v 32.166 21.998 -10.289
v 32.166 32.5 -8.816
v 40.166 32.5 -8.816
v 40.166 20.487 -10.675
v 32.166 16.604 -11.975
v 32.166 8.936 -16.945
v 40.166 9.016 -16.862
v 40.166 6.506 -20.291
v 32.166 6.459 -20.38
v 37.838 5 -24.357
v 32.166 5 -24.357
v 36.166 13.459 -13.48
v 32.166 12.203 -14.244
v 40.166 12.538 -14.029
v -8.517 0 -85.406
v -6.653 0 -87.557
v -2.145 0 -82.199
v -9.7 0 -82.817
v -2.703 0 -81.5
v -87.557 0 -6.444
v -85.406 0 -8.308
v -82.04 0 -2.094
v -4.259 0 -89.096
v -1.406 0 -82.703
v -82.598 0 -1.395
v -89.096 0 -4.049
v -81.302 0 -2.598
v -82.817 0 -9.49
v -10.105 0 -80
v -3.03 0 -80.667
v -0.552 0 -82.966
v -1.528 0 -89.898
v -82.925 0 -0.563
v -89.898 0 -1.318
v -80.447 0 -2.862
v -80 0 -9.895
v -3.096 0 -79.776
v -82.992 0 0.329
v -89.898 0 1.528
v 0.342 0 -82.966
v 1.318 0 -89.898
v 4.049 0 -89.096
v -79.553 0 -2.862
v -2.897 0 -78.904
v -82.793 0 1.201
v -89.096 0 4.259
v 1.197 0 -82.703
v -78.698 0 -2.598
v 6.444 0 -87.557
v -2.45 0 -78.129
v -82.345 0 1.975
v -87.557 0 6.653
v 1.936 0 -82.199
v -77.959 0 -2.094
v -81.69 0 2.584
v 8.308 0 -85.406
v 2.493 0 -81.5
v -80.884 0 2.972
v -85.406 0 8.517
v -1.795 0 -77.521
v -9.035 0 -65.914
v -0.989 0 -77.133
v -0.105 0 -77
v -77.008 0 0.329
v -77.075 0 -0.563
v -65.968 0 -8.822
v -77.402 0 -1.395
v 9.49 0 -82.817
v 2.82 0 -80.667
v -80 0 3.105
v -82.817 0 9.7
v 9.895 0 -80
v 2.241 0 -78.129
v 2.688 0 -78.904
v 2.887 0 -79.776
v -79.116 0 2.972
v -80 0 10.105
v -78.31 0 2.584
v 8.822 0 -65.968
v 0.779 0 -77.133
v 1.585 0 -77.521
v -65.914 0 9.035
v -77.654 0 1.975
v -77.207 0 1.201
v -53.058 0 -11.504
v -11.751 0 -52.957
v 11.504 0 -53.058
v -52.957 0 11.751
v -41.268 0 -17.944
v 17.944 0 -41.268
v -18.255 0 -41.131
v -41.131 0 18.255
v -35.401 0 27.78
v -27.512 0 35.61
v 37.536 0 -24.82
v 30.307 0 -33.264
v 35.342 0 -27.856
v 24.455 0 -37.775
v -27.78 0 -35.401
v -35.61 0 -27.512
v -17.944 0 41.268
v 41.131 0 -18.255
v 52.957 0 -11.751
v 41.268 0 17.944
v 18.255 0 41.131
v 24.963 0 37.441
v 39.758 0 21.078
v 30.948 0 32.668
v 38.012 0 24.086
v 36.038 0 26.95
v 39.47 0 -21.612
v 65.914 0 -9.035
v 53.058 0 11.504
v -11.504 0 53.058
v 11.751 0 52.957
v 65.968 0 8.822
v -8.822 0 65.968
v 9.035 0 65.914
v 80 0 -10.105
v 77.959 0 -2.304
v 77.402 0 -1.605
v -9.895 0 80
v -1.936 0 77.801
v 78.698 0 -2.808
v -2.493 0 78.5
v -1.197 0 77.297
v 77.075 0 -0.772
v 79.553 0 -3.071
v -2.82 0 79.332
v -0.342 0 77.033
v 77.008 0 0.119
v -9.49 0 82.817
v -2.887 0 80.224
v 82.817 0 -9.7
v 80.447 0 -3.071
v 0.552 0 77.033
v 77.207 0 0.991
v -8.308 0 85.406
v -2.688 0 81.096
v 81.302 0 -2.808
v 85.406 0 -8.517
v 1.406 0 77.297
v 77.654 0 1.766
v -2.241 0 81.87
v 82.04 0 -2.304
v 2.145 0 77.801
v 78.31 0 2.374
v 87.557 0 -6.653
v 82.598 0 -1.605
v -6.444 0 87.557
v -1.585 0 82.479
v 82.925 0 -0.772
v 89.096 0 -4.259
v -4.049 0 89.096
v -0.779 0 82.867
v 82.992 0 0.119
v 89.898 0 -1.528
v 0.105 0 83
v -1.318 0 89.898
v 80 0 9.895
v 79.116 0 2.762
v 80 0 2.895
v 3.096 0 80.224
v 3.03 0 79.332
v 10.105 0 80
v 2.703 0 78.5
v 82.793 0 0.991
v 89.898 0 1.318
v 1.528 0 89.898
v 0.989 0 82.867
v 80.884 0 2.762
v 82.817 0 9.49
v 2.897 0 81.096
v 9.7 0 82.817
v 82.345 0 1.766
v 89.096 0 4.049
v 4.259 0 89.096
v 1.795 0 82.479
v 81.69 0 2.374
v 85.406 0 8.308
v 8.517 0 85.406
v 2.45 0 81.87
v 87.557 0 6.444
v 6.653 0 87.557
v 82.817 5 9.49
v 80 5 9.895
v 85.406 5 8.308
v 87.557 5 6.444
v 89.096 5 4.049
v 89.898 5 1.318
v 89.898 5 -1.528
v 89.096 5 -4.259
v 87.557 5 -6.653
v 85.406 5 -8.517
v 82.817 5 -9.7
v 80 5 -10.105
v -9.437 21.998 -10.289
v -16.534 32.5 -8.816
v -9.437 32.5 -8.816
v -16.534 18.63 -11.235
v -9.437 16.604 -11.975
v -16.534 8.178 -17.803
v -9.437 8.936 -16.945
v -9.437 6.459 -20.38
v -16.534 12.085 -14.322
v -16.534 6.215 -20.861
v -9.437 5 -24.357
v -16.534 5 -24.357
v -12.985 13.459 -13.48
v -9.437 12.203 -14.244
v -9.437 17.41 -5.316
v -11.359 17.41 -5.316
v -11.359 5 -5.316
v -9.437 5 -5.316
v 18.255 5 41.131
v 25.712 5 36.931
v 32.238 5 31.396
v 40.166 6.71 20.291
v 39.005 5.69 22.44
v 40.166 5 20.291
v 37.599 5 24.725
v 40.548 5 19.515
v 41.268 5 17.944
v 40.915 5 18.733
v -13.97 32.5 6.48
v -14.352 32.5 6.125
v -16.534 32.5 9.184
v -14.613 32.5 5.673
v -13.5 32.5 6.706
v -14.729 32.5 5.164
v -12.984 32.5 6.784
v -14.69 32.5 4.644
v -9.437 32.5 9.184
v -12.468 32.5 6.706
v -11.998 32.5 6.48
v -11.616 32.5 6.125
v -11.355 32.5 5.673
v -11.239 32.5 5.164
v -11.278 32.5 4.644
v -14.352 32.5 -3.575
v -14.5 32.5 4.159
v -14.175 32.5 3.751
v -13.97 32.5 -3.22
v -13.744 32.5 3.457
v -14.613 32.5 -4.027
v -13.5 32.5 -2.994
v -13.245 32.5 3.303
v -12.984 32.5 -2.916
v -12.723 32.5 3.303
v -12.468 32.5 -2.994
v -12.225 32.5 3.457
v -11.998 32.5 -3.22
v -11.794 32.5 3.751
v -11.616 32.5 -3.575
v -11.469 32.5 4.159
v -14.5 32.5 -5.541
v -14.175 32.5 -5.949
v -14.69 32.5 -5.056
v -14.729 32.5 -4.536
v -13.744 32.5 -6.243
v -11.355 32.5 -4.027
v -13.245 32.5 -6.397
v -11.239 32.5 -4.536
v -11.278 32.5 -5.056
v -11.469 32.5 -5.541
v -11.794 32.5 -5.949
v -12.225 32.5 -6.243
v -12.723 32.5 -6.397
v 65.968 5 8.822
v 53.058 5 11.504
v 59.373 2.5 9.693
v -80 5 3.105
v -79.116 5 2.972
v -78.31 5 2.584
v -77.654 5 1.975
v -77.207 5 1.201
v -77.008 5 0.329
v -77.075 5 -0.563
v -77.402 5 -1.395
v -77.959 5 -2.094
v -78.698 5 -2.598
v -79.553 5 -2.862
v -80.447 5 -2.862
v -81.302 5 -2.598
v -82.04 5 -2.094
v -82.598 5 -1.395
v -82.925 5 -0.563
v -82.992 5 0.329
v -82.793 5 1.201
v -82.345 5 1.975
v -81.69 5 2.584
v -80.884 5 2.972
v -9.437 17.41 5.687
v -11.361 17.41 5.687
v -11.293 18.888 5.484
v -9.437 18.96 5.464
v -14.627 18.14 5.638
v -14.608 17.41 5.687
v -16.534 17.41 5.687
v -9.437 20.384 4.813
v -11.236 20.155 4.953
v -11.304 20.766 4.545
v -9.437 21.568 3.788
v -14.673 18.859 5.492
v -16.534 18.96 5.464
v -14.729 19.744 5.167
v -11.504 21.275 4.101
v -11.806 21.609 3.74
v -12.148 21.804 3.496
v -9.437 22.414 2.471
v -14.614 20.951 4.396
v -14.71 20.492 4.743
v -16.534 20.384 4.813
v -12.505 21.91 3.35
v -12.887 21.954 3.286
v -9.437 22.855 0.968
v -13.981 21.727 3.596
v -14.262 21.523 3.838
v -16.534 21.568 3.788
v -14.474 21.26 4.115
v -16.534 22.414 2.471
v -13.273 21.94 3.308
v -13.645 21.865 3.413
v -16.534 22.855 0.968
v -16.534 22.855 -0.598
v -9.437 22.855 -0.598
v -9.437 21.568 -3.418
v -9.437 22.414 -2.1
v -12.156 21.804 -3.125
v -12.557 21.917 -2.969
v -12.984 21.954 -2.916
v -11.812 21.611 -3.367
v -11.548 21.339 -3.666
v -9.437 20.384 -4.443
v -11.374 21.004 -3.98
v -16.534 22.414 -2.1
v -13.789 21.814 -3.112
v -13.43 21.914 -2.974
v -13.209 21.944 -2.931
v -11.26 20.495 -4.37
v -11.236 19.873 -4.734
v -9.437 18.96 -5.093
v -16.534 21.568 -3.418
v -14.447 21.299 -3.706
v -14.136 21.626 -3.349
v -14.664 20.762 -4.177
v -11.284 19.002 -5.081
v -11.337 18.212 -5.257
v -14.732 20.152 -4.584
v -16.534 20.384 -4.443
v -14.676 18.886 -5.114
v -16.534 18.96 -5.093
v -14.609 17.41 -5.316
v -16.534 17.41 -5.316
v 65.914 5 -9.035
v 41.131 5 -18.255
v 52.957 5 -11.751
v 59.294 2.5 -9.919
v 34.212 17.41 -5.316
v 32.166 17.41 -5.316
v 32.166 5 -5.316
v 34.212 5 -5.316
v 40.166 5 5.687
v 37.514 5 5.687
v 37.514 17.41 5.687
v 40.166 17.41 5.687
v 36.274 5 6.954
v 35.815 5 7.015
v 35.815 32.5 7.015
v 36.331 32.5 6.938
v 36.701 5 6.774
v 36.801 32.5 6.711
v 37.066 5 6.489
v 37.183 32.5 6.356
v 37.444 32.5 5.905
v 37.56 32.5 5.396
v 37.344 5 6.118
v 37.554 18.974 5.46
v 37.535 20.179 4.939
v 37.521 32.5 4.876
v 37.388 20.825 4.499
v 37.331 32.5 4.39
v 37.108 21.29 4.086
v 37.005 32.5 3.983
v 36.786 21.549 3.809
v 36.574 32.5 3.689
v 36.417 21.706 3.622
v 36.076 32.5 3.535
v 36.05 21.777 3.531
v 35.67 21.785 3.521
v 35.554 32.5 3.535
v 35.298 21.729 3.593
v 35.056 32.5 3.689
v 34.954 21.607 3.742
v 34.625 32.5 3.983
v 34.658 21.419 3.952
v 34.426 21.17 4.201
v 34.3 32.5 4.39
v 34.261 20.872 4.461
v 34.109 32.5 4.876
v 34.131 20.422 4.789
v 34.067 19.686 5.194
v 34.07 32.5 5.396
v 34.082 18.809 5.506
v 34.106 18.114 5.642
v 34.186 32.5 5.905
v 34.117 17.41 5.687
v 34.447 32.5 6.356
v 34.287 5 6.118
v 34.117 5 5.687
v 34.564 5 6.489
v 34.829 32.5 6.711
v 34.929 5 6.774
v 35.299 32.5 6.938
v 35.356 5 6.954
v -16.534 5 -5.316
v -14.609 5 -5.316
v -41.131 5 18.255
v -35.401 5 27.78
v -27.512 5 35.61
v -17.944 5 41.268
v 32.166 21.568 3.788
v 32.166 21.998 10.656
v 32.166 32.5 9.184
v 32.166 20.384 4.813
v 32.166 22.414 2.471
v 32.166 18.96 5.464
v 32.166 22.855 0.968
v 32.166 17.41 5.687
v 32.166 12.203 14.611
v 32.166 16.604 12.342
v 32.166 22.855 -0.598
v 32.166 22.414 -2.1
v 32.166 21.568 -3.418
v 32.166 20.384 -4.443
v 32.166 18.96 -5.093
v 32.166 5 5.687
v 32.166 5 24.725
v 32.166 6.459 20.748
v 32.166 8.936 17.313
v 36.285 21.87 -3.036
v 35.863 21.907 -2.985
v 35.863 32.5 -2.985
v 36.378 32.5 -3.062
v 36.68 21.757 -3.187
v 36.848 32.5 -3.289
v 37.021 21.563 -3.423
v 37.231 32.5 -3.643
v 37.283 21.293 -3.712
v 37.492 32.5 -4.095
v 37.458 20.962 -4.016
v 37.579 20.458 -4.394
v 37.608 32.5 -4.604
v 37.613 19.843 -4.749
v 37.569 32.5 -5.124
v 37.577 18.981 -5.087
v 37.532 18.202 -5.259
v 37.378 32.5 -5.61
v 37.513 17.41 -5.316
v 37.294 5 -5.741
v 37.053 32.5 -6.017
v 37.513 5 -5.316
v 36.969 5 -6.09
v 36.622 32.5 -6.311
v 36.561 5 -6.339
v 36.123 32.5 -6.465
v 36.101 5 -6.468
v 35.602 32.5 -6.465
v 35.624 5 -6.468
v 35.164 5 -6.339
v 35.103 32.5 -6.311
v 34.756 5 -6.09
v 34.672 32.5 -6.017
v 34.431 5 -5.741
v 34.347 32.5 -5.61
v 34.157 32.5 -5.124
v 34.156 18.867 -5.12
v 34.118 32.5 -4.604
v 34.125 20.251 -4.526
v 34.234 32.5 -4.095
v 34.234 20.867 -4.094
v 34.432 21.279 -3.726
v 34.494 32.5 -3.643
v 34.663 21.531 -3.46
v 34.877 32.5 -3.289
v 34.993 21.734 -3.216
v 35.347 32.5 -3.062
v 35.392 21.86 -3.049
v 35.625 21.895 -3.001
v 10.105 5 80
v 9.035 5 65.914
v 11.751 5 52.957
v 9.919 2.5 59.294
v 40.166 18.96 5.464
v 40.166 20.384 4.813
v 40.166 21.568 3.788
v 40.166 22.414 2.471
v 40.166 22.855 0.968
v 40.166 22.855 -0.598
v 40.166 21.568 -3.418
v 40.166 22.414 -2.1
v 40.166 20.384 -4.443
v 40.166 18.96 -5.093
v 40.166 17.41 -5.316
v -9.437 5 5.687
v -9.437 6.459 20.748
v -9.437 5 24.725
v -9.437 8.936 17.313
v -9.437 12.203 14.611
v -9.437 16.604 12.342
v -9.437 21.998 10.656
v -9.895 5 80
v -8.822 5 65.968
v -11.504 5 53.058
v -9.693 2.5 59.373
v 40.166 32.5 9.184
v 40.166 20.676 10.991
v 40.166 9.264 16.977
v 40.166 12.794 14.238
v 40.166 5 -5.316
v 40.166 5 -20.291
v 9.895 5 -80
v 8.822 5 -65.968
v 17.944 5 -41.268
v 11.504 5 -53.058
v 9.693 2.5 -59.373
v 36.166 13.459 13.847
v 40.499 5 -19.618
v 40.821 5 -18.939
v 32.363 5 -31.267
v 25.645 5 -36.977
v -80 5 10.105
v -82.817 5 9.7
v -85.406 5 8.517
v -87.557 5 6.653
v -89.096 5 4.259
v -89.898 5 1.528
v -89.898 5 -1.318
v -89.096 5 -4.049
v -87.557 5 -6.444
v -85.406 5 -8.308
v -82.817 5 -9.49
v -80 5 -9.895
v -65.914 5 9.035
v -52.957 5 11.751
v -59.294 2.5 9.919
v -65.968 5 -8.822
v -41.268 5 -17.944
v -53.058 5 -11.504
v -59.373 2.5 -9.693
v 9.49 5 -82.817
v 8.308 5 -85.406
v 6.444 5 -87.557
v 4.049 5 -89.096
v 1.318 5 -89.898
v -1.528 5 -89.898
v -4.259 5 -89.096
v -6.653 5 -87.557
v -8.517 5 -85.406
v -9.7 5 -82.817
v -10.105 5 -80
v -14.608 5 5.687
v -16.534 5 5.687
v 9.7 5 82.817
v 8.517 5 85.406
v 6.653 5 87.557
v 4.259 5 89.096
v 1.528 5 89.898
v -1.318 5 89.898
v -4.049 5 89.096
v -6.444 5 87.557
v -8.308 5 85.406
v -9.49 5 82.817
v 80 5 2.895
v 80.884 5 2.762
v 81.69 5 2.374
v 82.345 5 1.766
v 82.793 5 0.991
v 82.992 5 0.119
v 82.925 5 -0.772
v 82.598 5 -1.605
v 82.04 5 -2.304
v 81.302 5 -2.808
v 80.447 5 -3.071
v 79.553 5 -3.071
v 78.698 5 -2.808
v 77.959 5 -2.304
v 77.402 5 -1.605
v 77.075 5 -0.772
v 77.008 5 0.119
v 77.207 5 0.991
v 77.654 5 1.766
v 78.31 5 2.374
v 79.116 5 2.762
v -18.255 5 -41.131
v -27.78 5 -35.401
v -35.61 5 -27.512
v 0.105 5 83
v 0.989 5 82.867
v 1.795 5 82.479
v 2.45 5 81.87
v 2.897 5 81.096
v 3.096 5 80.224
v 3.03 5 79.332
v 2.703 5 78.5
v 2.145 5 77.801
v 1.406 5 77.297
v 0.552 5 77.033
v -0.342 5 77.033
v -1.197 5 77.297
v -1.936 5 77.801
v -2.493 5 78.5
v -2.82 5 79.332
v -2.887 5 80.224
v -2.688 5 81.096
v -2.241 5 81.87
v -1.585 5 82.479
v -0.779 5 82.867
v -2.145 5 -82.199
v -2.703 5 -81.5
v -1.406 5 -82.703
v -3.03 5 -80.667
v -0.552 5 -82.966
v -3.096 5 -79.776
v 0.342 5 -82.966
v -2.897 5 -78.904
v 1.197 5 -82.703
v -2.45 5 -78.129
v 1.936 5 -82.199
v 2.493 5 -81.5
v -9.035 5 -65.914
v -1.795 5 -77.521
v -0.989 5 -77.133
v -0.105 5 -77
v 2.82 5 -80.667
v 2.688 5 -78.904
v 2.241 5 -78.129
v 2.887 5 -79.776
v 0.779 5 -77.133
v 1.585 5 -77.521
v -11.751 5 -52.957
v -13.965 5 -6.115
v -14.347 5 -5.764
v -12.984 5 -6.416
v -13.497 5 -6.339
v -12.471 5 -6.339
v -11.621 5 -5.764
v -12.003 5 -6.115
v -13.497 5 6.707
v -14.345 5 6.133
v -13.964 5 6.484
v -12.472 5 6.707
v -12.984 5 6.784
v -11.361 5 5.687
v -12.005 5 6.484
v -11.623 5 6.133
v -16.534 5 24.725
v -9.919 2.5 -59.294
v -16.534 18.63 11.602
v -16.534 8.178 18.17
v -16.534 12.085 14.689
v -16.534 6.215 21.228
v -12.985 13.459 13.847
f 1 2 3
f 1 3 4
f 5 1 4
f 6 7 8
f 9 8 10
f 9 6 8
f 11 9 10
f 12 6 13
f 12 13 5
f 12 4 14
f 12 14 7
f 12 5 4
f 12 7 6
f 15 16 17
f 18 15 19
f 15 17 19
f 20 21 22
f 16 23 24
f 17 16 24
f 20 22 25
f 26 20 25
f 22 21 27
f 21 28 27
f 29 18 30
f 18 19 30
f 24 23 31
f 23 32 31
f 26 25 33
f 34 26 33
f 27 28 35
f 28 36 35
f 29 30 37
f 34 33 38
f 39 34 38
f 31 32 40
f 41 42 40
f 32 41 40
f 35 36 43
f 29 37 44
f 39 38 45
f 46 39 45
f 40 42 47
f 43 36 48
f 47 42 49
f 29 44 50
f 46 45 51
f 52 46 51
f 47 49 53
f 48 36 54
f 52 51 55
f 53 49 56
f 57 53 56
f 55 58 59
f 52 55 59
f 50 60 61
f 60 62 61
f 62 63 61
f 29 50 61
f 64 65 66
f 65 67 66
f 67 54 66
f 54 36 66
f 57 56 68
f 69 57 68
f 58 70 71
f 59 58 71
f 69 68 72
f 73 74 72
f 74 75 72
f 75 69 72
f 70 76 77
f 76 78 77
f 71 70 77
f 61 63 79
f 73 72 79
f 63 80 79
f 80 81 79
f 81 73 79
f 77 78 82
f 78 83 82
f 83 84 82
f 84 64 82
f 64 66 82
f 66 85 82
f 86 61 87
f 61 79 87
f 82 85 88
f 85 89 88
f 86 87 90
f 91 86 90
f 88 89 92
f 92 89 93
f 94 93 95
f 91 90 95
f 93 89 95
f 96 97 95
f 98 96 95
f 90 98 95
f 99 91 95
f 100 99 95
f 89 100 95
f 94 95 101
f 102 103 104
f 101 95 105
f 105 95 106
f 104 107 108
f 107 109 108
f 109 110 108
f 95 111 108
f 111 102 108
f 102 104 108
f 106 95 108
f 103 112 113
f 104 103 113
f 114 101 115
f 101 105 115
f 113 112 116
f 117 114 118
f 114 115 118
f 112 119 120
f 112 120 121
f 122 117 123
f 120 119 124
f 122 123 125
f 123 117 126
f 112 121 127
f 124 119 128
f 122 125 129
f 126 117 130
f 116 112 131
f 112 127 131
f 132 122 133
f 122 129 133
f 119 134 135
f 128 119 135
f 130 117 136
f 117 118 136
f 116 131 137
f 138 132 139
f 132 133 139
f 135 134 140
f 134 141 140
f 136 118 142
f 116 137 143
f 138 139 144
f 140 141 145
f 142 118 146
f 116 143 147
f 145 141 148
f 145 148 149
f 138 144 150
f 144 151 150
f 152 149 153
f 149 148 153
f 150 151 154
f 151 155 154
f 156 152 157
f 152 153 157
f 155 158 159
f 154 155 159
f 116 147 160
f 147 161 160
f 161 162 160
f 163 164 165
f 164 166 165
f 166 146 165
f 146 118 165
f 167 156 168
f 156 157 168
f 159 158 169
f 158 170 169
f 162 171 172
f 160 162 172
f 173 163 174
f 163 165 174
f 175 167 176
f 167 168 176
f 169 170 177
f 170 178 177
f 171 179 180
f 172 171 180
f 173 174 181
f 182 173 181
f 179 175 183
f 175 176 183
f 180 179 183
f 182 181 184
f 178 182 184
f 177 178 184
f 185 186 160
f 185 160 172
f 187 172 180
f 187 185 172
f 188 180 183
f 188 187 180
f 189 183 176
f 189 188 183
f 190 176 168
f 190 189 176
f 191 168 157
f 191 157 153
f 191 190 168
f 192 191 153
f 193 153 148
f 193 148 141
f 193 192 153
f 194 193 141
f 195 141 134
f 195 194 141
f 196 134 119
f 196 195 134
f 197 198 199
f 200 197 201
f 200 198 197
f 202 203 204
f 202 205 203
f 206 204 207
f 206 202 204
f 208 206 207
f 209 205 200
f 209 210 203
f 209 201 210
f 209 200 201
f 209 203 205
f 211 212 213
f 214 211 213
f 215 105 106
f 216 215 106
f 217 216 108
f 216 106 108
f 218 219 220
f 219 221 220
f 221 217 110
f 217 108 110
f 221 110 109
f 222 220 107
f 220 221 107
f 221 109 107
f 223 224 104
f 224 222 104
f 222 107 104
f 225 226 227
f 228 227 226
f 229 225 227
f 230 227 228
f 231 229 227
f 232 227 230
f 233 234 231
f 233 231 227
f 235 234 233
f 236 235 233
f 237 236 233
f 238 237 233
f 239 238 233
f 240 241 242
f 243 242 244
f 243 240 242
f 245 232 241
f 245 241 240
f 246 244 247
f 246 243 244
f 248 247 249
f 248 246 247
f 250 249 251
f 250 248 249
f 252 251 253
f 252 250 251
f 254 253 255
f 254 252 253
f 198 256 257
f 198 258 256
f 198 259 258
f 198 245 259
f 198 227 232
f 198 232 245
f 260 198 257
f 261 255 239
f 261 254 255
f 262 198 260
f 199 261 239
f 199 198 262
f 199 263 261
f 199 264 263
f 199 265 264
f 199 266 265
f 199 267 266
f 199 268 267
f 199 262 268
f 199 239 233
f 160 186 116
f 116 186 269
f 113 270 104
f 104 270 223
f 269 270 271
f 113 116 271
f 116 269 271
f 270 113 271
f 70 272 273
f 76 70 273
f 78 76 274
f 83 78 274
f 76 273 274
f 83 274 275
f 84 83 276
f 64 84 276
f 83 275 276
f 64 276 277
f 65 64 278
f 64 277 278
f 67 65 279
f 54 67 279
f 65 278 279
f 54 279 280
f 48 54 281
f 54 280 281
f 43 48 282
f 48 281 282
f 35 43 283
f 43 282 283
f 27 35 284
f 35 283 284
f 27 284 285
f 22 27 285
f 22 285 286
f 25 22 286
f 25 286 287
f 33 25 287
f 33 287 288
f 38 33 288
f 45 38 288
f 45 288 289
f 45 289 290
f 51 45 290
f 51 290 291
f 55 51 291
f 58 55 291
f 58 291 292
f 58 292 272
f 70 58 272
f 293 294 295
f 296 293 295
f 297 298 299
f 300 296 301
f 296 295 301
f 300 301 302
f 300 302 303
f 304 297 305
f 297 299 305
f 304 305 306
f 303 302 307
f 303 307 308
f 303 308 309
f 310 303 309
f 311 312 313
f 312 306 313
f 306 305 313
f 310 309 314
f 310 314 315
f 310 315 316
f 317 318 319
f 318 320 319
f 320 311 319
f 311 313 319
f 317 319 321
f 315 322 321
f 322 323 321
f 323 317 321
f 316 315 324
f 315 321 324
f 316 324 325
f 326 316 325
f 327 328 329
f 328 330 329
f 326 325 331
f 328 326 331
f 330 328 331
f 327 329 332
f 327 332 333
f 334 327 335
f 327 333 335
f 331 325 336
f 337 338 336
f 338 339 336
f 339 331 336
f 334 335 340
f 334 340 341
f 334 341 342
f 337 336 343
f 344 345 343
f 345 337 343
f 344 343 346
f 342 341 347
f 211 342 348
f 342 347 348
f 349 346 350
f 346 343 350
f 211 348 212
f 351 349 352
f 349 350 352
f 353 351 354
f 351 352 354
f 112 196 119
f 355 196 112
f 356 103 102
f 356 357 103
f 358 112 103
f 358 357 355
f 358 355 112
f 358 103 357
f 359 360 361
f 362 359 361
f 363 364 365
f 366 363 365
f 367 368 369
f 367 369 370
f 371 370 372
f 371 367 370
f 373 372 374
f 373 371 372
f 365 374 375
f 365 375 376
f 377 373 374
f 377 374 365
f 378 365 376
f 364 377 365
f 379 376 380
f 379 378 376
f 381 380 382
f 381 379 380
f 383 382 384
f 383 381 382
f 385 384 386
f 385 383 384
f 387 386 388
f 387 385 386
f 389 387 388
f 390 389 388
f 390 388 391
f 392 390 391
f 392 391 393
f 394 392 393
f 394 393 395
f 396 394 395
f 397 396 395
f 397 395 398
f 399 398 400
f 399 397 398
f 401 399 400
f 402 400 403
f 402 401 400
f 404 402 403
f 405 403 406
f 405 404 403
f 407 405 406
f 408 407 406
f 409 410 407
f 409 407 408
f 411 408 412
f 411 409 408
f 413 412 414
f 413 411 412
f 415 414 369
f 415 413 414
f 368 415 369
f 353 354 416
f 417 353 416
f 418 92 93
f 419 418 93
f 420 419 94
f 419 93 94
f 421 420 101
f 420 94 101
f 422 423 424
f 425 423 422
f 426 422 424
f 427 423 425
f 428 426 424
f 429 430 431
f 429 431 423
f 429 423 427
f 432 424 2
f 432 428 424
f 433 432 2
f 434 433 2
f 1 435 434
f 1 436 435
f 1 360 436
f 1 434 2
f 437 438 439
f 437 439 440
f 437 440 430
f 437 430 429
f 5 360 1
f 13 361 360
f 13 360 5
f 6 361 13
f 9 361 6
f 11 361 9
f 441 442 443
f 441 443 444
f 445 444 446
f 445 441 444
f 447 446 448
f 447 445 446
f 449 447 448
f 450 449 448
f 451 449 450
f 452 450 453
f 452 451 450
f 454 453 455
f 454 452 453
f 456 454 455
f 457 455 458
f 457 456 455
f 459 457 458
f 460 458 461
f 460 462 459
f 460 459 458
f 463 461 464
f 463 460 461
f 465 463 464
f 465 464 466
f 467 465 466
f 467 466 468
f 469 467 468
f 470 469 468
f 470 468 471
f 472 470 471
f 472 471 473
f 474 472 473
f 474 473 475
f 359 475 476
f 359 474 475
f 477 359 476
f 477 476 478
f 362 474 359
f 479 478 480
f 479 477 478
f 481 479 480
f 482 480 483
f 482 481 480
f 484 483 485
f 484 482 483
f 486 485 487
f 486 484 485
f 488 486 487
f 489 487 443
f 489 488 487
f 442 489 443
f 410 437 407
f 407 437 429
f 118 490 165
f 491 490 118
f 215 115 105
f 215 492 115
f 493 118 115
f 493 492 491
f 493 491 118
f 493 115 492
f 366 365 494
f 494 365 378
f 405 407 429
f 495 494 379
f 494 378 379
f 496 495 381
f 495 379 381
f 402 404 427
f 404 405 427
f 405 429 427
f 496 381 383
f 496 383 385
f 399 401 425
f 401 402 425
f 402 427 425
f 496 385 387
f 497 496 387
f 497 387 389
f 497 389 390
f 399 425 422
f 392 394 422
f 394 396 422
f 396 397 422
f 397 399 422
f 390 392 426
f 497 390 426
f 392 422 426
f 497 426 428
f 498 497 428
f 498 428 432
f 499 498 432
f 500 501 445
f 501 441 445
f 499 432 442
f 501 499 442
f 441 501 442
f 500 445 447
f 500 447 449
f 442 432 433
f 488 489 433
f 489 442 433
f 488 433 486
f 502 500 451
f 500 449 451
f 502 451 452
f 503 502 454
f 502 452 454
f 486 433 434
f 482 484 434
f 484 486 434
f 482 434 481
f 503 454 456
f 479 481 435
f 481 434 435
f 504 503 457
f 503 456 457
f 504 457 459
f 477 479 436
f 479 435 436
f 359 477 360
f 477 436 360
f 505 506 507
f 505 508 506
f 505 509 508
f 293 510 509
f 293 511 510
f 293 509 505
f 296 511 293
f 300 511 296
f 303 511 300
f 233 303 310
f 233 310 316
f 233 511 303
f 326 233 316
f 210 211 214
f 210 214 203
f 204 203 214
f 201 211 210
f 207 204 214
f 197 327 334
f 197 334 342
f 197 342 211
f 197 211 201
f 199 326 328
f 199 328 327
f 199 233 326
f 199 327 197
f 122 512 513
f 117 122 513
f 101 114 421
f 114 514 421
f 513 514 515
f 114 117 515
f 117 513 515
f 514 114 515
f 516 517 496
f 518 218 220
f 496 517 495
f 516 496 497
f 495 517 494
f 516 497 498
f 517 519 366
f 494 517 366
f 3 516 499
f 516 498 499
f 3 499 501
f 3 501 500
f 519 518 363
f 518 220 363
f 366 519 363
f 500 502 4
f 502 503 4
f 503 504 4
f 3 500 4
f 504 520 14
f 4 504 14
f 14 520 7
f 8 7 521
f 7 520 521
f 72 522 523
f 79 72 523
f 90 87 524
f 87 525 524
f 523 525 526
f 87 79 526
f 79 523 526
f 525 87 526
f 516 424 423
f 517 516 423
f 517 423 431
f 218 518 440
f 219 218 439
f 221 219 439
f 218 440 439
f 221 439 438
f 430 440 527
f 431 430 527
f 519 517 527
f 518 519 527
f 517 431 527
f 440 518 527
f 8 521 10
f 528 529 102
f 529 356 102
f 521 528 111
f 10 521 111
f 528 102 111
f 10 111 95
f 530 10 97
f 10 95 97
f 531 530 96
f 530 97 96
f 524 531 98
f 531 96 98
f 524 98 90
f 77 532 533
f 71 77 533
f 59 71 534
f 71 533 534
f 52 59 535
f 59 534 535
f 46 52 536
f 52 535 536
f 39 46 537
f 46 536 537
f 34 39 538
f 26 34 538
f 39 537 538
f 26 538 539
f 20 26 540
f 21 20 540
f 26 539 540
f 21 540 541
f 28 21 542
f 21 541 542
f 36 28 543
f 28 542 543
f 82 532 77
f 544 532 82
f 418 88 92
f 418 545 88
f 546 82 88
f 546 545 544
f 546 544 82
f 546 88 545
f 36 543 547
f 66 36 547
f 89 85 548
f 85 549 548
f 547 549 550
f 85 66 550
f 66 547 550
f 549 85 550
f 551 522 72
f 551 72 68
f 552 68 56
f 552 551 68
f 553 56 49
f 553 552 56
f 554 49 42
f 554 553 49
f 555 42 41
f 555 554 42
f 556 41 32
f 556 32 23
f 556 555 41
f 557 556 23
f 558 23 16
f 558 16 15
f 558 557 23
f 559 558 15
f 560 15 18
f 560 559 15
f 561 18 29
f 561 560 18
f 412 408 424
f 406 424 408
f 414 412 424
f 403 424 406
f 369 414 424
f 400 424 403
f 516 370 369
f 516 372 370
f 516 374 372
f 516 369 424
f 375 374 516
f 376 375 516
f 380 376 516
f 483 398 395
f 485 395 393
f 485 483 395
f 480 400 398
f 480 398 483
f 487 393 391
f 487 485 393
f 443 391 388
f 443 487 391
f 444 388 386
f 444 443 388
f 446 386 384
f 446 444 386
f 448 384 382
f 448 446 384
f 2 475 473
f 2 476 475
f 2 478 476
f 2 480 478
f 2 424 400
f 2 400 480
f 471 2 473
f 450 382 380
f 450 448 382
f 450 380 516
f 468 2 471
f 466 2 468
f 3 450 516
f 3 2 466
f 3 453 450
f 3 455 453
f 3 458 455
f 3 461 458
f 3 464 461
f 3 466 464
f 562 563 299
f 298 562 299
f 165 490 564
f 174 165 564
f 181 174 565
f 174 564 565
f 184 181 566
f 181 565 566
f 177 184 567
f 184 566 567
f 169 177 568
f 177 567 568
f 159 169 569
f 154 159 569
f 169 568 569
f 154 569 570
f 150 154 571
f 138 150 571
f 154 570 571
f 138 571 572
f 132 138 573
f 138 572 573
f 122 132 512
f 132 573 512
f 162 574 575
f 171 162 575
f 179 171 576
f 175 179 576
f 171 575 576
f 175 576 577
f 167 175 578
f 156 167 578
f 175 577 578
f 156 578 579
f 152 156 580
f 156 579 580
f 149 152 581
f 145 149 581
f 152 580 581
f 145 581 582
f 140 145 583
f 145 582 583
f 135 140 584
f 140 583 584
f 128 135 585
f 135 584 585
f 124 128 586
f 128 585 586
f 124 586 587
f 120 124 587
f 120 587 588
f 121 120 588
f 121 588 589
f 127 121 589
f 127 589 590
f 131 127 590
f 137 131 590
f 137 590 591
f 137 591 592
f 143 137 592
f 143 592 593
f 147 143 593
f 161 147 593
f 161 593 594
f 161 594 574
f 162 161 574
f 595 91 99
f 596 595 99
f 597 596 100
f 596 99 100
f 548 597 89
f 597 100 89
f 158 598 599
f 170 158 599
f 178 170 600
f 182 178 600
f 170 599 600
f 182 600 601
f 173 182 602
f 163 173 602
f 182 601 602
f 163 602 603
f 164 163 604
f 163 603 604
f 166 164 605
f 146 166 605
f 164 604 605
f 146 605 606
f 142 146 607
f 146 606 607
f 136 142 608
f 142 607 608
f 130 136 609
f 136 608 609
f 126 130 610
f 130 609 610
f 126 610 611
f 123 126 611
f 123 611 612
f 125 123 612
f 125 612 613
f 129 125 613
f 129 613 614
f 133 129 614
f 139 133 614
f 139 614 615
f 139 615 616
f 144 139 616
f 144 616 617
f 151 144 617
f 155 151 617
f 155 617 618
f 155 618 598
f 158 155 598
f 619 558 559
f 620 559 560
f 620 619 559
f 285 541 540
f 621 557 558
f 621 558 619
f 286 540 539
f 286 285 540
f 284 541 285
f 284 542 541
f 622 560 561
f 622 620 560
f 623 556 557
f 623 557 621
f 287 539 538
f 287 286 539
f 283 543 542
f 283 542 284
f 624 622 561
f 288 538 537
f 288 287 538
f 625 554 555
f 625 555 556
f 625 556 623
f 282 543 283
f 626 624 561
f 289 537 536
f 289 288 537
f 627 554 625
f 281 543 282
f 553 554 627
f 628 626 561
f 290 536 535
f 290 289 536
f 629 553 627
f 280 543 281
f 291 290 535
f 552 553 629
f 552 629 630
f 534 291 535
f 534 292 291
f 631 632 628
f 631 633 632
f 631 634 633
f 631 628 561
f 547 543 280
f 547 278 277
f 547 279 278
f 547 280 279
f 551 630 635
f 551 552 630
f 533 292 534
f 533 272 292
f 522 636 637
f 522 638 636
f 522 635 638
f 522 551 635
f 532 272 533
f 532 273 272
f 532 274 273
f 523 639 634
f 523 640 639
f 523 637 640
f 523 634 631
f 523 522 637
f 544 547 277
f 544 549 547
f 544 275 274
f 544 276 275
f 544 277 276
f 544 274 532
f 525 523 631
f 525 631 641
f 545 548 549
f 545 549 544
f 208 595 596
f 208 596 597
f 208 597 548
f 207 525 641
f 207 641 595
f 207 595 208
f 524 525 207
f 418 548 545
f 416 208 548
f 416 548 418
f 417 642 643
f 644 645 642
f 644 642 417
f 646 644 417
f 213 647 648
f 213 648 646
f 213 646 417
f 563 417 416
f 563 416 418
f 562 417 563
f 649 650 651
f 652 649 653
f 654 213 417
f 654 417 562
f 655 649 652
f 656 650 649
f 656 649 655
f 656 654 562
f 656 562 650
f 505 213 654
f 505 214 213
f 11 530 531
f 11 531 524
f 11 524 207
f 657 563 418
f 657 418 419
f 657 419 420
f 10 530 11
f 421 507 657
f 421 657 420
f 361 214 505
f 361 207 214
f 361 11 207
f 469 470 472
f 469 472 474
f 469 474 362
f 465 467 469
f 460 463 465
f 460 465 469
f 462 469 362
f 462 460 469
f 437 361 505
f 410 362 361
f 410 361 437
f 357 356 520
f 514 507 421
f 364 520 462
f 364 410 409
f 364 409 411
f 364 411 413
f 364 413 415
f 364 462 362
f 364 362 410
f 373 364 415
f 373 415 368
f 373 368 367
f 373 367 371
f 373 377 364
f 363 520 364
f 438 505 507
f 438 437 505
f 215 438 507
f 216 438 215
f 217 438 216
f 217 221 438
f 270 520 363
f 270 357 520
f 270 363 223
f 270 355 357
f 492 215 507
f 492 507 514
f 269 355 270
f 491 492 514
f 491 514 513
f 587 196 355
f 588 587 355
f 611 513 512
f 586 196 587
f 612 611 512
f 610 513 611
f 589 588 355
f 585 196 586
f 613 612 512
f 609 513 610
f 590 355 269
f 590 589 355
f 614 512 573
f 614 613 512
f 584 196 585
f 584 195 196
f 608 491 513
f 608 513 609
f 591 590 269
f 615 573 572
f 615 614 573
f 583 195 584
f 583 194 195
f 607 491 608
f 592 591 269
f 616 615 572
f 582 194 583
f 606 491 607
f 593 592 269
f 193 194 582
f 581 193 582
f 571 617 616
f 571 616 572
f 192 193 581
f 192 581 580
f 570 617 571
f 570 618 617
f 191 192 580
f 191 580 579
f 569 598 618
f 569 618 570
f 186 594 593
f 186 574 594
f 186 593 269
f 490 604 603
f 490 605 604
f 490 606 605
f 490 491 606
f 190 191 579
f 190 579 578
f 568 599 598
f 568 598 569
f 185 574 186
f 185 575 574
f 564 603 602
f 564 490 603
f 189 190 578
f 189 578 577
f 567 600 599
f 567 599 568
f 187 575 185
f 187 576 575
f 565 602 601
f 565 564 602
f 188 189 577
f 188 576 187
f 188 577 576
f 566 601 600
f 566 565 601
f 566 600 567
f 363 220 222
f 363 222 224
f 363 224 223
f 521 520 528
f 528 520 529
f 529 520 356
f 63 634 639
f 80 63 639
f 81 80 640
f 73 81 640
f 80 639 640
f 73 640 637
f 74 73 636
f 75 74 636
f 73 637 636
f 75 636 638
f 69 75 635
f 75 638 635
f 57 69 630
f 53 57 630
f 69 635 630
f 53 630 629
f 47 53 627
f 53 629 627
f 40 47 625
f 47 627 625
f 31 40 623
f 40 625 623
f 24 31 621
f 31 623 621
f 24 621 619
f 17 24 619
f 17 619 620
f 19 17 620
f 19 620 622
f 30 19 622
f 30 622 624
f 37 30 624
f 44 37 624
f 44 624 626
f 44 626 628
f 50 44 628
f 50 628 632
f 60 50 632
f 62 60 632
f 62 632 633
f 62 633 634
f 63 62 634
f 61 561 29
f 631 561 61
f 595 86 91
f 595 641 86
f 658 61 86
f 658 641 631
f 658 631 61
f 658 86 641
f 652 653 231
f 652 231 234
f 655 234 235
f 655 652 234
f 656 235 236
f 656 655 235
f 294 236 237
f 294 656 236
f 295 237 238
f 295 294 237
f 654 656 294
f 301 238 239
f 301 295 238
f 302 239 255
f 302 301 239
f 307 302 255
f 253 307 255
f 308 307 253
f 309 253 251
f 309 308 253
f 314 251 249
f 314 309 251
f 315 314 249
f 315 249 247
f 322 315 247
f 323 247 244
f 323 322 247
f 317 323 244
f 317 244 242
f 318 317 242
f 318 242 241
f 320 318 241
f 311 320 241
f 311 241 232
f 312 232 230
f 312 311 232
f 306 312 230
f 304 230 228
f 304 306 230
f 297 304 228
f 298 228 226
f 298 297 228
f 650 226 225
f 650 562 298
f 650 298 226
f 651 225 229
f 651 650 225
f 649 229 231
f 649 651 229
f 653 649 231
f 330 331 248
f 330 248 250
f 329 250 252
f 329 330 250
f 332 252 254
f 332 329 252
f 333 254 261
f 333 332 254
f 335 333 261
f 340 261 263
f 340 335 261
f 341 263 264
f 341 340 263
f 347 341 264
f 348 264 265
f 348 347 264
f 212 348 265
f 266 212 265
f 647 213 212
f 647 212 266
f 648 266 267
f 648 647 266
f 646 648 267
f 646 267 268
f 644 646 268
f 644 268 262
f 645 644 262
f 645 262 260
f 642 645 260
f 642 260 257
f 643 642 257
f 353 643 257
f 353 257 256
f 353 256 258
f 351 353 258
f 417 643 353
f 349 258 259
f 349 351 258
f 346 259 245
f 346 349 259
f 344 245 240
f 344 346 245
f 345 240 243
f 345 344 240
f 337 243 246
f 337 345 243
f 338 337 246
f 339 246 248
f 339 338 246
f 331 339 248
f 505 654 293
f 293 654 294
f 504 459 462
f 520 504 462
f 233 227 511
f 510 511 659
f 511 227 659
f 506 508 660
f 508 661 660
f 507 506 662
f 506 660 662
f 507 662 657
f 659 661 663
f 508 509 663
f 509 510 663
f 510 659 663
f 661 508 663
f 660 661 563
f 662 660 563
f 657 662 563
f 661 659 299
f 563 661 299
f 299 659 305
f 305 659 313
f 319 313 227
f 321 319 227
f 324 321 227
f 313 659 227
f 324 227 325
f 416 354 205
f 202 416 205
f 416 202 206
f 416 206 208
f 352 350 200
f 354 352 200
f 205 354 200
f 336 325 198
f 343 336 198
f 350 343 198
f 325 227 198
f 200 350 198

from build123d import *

# Parameters (mm, degrees)
SKIZZE1_R                            = 45
AUFSATZ_LINEAR_AUSTRAGEN1_DEPTH      = 5
SKIZZE3_W                            = 8
SKIZZE3_H                            = 18
AUFSATZ_LINEAR_AUSTRAGEN2_DEPTH      = 27.5
SCHNITT_LINEAR_AUSTRAGEN1_DEPTH      = 70.55
AUFSATZ_LINEAR_AUSTRAGEN3_DEPTH      = 56.7
SCHNITT_LINEAR_AUSTRAGEN2_DEPTH      = 10
SCHNITT_LINEAR_AUSTRAGEN3_DEPTH      = 78.313941464
SCHNITT_LINEAR_AUSTRAGEN3_DEPTH_BACK = 78.313941464
SKIZZE7_W                            = 40.7
SKIZZE7_H                            = 27.5
SCHNITT_LINEAR_START                 = -27.5
SKIZZE8_R                            = 1.75
SCHNITT_LINEAR_AUSTRAGEN4_DEPTH      = 27.5
AUFSATZ_LINEAR_AUSTRAGEN4_DEPTH      = 5
SCHNITT_LINEAR_AUSTRAGEN5_REACH      = 133.363
SKIZZE10_W                           = 0.902438157
SKIZZE10_H                           = 49.081982533
SKIZZE11_R                           = 3
SCHNITT_LINEAR_AUSTRAGEN6_DEPTH      = 14.11


with BuildPart() as part:
    # Skizze1 → Aufsatz-Linear austragen1 (new body)
    with BuildSketch(Plane(origin=(0, 0, 0), x_dir=(1, 0, 0), z_dir=(0, 1, 0))):
        with Locations(Location((0, 0, 0), (0, 0, 270))):
            Circle(SKIZZE1_R)
    extrude(amount=AUFSATZ_LINEAR_AUSTRAGEN1_DEPTH)

    # Skizze3 → Aufsatz-Linear austragen2 (add)
    with BuildSketch(Plane(origin=(0, 5, 0), x_dir=(1, 0, 0), z_dir=(0, 1, 0))):
        with Locations((-12.534256165, -0.183687062)):
            Rectangle(SKIZZE3_W, SKIZZE3_H)
        with Locations((36.165743835, -0.183687062)):
            Rectangle(SKIZZE3_W, SKIZZE3_H)
    extrude(amount=AUFSATZ_LINEAR_AUSTRAGEN2_DEPTH)

    # Skizze4 → Schnitt-Linear austragen1 (cut)
    with BuildSketch(Plane.ZY.offset(16.534256165)):
        with BuildLine():
            Line((-5.316312938, 5), (5.686817911, 5))
            Line((5.686817911, 5), (5.686817911, 17.409920336))
            ThreePointArc((5.686817911, 17.409920336), (0.185252486, 22.91148576), (-5.316312938, 17.409920336))
            Line((-5.316312938, 17.409920336), (-5.316312938, 5))
        make_face()
    extrude(amount=-SCHNITT_LINEAR_AUSTRAGEN1_DEPTH, mode=Mode.SUBTRACT)

    # Skizze5 → Aufsatz-Linear austragen3 (add)
    with BuildSketch(Plane.ZY.offset(16.534256165)):
        with BuildLine():
            Line((-8.816312938, 32.5), (-8.816312938, 5))
            Line((-8.816312938, 5), (-24.357304204, 5))
            add(Edge.make_bspline(
                [(-8.816312938, 32.5), (-10.372494309, 8.167321108), (-24.357304204, 5)],
                knots=[0, 0, 0, 1, 1, 1], degree=2))
        make_face()
        with BuildLine():
            Line((9.183687062, 32.5), (9.183687062, 5))
            Line((9.183687062, 5), (24.724678329, 5))
            add(Edge.make_bspline(
                [(9.183687062, 32.5), (10.739868433, 8.167321108), (24.724678329, 5)],
                knots=[0, 0, 0, 1, 1, 1], degree=2))
        make_face()
    extrude(amount=-AUFSATZ_LINEAR_AUSTRAGEN3_DEPTH)

    # Skizze6 → Schnitt-Linear austragen2 (cut)
    with BuildSketch(Plane.XZ):
        with BuildLine():
            Line((36.037718441, 26.949635426), (42.778201445, 28.630726097))
            Line((42.778201445, 28.630726097), (51.77679317, -24.277660434))
            Line((51.77679317, -24.277660434), (37.77898382, -29.776799822))
            Line((37.77898382, -29.776799822), (35.341876768, -27.855910441))
            ThreePointArc((35.341876768, -27.855910441), (44.996373382, -0.571298967), (36.037718441, 26.949635426))
        make_face()
    extrude(amount=-SCHNITT_LINEAR_AUSTRAGEN2_DEPTH, mode=Mode.SUBTRACT)

    # Skizze7 → Schnitt-Linear austragen3 (cut, two sides: drawn at the far end of the back side and taken through both)
    with BuildSketch(Plane.XY.offset(-8.816312938).offset(-SCHNITT_LINEAR_AUSTRAGEN3_DEPTH_BACK)):
        with Locations((11.815743835, 18.75)):
            Rectangle(SKIZZE7_W, SKIZZE7_H)
    extrude(amount=SCHNITT_LINEAR_AUSTRAGEN3_DEPTH + SCHNITT_LINEAR_AUSTRAGEN3_DEPTH_BACK, mode=Mode.SUBTRACT)

    # Skizze8 → Schnitt-Linear austragen4 (cut)
    with BuildSketch(Plane(origin=(0, 32.5, 0), x_dir=(1, 0, 0), z_dir=(0, 1, 0)).offset(SCHNITT_LINEAR_START)):
        with Locations(Location((-12.984256165, 4.666312938, 0), (0, 0, 270))):
            Circle(SKIZZE8_R)
        with Locations(Location((-12.984256165, -5.033687062, 0), (0, 0, 270))):
            Circle(SKIZZE8_R)
        with Locations(Location((35.81519379, -5.265385311, 0), (0, 0, 270))):
            Circle(SKIZZE8_R)
        with Locations(Location((35.862672939, 4.734501975, 0), (0, 0, 270))):
            Circle(SKIZZE8_R)
    extrude(amount=SCHNITT_LINEAR_AUSTRAGEN4_DEPTH, mode=Mode.SUBTRACT)

    # Skizze9 → Aufsatz-Linear austragen4 (add, through all)
    with BuildSketch(Plane(origin=(0, 5, 0), x_dir=(1, 0, 0), z_dir=(0, 1, 0))):
        with BuildLine():
            Line((-18.254939841, 41.130975814), (18.045289753, 41.130975814))
            add(Edge.make_bspline(
                [(9.895174956, 79.999931323), (5.449457034, 58.022999533), (18.045289753, 41.130975814)],
                knots=[0, 0, 0, 1, 1, 1], degree=2))
            ThreePointArc((9.895174956, 79.999931323), (-0.104825044, 89.999931323), (-10.104825044, 79.999931323))
            add(Edge.make_bspline(
                [(-10.104825044, 79.999931323), (-5.659107122, 58.022999533), (-18.254939841, 41.130975814)],
                knots=[0, 0, 0, 1, 1, 1], degree=2))
        make_face()
        with BuildLine():
            Line((41.130975814, 18.254939841), (41.130975814, -18.045289753))
            add(Edge.make_bspline(
                [(79.999931323, -9.895174956), (58.022999533, -5.449457034), (41.130975814, -18.045289753)],
                knots=[0, 0, 0, 1, 1, 1], degree=2))
            ThreePointArc((79.999931323, -9.895174956), (89.999931323, 0.104825044), (79.999931323, 10.104825044))
            add(Edge.make_bspline(
                [(79.999931323, 10.104825044), (58.022999533, 5.659107122), (41.130975814, 18.254939841)],
                knots=[0, 0, 0, 1, 1, 1], degree=2))
        make_face()
        with BuildLine():
            Line((-18.045289753, -41.130975814), (18.254939841, -41.130975814))
            add(Edge.make_bspline(
                [(10.104825044, -79.999931323), (5.659107122, -58.022999533), (18.254939841, -41.130975814)],
                knots=[0, 0, 0, 1, 1, 1], degree=2))
            ThreePointArc((10.104825044, -79.999931323), (0.104825044, -89.999931323), (-9.895174956, -79.999931323))
            add(Edge.make_bspline(
                [(-9.895174956, -79.999931323), (-5.449457034, -58.022999533), (-18.045289753, -41.130975814)],
                knots=[0, 0, 0, 1, 1, 1], degree=2))
        make_face()
        with BuildLine():
            Line((-41.130975814, 18.045289753), (-41.130975814, -18.254939841))
            add(Edge.make_bspline(
                [(-79.999931323, -10.104825044), (-58.022999533, -5.659107122), (-41.130975814, -18.254939841)],
                knots=[0, 0, 0, 1, 1, 1], degree=2))
            ThreePointArc((-79.999931323, -10.104825044), (-89.999931323, -0.104825044), (-79.999931323, 9.895174956))
            add(Edge.make_bspline(
                [(-79.999931323, 9.895174956), (-58.022999533, 5.449457034), (-41.130975814, 18.045289753)],
                knots=[0, 0, 0, 1, 1, 1], degree=2))
        make_face()
    extrude(amount=-AUFSATZ_LINEAR_AUSTRAGEN4_DEPTH)

    # Schnitt-Linear austragen5: up to this face of the body (flat: up to its plane)
    schnitt_linear_austragen5_end = Plane(part.part.faces().sort_by_distance((-0.703165137, 5, -0.008888692))[0])
    # Skizze10 → Schnitt-Linear austragen5 (cut, up to the picked face)
    with BuildSketch(Plane(origin=(0, 32.5, 0), x_dir=(1, 0, 0), z_dir=(0, 1, 0)), mode=Mode.PRIVATE) as schnitt_linear_austragen5_sk1:
        with Locations((-8.985475244, -0.183687063)):
            Rectangle(SKIZZE10_W, SKIZZE10_H)
    schnitt_linear_austragen5_tool1 = split(extrude(schnitt_linear_austragen5_sk1.sketch, amount=-SCHNITT_LINEAR_AUSTRAGEN5_REACH, mode=Mode.PRIVATE), bisect_by=schnitt_linear_austragen5_end, keep=Keep.BOTH, mode=Mode.PRIVATE)
    add(schnitt_linear_austragen5_tool1.solids().sort_by(Axis((-8.985475, 32.5, 0.183687), (0, -1, 0)))[0], mode=Mode.SUBTRACT)

    # Skizze11 → Schnitt-Linear austragen6 (cut)
    with BuildSketch(Plane(origin=(0, 5, 0), x_dir=(1, 0, 0), z_dir=(0, 1, 0))):
        with Locations(Location((-79.999931323, -0.104825044, 0), (0, 0, 270))):
            Circle(SKIZZE11_R)
        with Locations(Location((-0.104825044, 79.999931323, 0), (0, 0, 270))):
            Circle(SKIZZE11_R)
        with Locations(Location((79.999931323, 0.104825044, 0), (0, 0, 270))):
            Circle(SKIZZE11_R)
        with Locations(Location((0.104825044, -79.999931323, 0), (0, 0, 270))):
            Circle(SKIZZE11_R)
    extrude(amount=-SCHNITT_LINEAR_AUSTRAGEN6_DEPTH, mode=Mode.SUBTRACT)


solid = part.part
